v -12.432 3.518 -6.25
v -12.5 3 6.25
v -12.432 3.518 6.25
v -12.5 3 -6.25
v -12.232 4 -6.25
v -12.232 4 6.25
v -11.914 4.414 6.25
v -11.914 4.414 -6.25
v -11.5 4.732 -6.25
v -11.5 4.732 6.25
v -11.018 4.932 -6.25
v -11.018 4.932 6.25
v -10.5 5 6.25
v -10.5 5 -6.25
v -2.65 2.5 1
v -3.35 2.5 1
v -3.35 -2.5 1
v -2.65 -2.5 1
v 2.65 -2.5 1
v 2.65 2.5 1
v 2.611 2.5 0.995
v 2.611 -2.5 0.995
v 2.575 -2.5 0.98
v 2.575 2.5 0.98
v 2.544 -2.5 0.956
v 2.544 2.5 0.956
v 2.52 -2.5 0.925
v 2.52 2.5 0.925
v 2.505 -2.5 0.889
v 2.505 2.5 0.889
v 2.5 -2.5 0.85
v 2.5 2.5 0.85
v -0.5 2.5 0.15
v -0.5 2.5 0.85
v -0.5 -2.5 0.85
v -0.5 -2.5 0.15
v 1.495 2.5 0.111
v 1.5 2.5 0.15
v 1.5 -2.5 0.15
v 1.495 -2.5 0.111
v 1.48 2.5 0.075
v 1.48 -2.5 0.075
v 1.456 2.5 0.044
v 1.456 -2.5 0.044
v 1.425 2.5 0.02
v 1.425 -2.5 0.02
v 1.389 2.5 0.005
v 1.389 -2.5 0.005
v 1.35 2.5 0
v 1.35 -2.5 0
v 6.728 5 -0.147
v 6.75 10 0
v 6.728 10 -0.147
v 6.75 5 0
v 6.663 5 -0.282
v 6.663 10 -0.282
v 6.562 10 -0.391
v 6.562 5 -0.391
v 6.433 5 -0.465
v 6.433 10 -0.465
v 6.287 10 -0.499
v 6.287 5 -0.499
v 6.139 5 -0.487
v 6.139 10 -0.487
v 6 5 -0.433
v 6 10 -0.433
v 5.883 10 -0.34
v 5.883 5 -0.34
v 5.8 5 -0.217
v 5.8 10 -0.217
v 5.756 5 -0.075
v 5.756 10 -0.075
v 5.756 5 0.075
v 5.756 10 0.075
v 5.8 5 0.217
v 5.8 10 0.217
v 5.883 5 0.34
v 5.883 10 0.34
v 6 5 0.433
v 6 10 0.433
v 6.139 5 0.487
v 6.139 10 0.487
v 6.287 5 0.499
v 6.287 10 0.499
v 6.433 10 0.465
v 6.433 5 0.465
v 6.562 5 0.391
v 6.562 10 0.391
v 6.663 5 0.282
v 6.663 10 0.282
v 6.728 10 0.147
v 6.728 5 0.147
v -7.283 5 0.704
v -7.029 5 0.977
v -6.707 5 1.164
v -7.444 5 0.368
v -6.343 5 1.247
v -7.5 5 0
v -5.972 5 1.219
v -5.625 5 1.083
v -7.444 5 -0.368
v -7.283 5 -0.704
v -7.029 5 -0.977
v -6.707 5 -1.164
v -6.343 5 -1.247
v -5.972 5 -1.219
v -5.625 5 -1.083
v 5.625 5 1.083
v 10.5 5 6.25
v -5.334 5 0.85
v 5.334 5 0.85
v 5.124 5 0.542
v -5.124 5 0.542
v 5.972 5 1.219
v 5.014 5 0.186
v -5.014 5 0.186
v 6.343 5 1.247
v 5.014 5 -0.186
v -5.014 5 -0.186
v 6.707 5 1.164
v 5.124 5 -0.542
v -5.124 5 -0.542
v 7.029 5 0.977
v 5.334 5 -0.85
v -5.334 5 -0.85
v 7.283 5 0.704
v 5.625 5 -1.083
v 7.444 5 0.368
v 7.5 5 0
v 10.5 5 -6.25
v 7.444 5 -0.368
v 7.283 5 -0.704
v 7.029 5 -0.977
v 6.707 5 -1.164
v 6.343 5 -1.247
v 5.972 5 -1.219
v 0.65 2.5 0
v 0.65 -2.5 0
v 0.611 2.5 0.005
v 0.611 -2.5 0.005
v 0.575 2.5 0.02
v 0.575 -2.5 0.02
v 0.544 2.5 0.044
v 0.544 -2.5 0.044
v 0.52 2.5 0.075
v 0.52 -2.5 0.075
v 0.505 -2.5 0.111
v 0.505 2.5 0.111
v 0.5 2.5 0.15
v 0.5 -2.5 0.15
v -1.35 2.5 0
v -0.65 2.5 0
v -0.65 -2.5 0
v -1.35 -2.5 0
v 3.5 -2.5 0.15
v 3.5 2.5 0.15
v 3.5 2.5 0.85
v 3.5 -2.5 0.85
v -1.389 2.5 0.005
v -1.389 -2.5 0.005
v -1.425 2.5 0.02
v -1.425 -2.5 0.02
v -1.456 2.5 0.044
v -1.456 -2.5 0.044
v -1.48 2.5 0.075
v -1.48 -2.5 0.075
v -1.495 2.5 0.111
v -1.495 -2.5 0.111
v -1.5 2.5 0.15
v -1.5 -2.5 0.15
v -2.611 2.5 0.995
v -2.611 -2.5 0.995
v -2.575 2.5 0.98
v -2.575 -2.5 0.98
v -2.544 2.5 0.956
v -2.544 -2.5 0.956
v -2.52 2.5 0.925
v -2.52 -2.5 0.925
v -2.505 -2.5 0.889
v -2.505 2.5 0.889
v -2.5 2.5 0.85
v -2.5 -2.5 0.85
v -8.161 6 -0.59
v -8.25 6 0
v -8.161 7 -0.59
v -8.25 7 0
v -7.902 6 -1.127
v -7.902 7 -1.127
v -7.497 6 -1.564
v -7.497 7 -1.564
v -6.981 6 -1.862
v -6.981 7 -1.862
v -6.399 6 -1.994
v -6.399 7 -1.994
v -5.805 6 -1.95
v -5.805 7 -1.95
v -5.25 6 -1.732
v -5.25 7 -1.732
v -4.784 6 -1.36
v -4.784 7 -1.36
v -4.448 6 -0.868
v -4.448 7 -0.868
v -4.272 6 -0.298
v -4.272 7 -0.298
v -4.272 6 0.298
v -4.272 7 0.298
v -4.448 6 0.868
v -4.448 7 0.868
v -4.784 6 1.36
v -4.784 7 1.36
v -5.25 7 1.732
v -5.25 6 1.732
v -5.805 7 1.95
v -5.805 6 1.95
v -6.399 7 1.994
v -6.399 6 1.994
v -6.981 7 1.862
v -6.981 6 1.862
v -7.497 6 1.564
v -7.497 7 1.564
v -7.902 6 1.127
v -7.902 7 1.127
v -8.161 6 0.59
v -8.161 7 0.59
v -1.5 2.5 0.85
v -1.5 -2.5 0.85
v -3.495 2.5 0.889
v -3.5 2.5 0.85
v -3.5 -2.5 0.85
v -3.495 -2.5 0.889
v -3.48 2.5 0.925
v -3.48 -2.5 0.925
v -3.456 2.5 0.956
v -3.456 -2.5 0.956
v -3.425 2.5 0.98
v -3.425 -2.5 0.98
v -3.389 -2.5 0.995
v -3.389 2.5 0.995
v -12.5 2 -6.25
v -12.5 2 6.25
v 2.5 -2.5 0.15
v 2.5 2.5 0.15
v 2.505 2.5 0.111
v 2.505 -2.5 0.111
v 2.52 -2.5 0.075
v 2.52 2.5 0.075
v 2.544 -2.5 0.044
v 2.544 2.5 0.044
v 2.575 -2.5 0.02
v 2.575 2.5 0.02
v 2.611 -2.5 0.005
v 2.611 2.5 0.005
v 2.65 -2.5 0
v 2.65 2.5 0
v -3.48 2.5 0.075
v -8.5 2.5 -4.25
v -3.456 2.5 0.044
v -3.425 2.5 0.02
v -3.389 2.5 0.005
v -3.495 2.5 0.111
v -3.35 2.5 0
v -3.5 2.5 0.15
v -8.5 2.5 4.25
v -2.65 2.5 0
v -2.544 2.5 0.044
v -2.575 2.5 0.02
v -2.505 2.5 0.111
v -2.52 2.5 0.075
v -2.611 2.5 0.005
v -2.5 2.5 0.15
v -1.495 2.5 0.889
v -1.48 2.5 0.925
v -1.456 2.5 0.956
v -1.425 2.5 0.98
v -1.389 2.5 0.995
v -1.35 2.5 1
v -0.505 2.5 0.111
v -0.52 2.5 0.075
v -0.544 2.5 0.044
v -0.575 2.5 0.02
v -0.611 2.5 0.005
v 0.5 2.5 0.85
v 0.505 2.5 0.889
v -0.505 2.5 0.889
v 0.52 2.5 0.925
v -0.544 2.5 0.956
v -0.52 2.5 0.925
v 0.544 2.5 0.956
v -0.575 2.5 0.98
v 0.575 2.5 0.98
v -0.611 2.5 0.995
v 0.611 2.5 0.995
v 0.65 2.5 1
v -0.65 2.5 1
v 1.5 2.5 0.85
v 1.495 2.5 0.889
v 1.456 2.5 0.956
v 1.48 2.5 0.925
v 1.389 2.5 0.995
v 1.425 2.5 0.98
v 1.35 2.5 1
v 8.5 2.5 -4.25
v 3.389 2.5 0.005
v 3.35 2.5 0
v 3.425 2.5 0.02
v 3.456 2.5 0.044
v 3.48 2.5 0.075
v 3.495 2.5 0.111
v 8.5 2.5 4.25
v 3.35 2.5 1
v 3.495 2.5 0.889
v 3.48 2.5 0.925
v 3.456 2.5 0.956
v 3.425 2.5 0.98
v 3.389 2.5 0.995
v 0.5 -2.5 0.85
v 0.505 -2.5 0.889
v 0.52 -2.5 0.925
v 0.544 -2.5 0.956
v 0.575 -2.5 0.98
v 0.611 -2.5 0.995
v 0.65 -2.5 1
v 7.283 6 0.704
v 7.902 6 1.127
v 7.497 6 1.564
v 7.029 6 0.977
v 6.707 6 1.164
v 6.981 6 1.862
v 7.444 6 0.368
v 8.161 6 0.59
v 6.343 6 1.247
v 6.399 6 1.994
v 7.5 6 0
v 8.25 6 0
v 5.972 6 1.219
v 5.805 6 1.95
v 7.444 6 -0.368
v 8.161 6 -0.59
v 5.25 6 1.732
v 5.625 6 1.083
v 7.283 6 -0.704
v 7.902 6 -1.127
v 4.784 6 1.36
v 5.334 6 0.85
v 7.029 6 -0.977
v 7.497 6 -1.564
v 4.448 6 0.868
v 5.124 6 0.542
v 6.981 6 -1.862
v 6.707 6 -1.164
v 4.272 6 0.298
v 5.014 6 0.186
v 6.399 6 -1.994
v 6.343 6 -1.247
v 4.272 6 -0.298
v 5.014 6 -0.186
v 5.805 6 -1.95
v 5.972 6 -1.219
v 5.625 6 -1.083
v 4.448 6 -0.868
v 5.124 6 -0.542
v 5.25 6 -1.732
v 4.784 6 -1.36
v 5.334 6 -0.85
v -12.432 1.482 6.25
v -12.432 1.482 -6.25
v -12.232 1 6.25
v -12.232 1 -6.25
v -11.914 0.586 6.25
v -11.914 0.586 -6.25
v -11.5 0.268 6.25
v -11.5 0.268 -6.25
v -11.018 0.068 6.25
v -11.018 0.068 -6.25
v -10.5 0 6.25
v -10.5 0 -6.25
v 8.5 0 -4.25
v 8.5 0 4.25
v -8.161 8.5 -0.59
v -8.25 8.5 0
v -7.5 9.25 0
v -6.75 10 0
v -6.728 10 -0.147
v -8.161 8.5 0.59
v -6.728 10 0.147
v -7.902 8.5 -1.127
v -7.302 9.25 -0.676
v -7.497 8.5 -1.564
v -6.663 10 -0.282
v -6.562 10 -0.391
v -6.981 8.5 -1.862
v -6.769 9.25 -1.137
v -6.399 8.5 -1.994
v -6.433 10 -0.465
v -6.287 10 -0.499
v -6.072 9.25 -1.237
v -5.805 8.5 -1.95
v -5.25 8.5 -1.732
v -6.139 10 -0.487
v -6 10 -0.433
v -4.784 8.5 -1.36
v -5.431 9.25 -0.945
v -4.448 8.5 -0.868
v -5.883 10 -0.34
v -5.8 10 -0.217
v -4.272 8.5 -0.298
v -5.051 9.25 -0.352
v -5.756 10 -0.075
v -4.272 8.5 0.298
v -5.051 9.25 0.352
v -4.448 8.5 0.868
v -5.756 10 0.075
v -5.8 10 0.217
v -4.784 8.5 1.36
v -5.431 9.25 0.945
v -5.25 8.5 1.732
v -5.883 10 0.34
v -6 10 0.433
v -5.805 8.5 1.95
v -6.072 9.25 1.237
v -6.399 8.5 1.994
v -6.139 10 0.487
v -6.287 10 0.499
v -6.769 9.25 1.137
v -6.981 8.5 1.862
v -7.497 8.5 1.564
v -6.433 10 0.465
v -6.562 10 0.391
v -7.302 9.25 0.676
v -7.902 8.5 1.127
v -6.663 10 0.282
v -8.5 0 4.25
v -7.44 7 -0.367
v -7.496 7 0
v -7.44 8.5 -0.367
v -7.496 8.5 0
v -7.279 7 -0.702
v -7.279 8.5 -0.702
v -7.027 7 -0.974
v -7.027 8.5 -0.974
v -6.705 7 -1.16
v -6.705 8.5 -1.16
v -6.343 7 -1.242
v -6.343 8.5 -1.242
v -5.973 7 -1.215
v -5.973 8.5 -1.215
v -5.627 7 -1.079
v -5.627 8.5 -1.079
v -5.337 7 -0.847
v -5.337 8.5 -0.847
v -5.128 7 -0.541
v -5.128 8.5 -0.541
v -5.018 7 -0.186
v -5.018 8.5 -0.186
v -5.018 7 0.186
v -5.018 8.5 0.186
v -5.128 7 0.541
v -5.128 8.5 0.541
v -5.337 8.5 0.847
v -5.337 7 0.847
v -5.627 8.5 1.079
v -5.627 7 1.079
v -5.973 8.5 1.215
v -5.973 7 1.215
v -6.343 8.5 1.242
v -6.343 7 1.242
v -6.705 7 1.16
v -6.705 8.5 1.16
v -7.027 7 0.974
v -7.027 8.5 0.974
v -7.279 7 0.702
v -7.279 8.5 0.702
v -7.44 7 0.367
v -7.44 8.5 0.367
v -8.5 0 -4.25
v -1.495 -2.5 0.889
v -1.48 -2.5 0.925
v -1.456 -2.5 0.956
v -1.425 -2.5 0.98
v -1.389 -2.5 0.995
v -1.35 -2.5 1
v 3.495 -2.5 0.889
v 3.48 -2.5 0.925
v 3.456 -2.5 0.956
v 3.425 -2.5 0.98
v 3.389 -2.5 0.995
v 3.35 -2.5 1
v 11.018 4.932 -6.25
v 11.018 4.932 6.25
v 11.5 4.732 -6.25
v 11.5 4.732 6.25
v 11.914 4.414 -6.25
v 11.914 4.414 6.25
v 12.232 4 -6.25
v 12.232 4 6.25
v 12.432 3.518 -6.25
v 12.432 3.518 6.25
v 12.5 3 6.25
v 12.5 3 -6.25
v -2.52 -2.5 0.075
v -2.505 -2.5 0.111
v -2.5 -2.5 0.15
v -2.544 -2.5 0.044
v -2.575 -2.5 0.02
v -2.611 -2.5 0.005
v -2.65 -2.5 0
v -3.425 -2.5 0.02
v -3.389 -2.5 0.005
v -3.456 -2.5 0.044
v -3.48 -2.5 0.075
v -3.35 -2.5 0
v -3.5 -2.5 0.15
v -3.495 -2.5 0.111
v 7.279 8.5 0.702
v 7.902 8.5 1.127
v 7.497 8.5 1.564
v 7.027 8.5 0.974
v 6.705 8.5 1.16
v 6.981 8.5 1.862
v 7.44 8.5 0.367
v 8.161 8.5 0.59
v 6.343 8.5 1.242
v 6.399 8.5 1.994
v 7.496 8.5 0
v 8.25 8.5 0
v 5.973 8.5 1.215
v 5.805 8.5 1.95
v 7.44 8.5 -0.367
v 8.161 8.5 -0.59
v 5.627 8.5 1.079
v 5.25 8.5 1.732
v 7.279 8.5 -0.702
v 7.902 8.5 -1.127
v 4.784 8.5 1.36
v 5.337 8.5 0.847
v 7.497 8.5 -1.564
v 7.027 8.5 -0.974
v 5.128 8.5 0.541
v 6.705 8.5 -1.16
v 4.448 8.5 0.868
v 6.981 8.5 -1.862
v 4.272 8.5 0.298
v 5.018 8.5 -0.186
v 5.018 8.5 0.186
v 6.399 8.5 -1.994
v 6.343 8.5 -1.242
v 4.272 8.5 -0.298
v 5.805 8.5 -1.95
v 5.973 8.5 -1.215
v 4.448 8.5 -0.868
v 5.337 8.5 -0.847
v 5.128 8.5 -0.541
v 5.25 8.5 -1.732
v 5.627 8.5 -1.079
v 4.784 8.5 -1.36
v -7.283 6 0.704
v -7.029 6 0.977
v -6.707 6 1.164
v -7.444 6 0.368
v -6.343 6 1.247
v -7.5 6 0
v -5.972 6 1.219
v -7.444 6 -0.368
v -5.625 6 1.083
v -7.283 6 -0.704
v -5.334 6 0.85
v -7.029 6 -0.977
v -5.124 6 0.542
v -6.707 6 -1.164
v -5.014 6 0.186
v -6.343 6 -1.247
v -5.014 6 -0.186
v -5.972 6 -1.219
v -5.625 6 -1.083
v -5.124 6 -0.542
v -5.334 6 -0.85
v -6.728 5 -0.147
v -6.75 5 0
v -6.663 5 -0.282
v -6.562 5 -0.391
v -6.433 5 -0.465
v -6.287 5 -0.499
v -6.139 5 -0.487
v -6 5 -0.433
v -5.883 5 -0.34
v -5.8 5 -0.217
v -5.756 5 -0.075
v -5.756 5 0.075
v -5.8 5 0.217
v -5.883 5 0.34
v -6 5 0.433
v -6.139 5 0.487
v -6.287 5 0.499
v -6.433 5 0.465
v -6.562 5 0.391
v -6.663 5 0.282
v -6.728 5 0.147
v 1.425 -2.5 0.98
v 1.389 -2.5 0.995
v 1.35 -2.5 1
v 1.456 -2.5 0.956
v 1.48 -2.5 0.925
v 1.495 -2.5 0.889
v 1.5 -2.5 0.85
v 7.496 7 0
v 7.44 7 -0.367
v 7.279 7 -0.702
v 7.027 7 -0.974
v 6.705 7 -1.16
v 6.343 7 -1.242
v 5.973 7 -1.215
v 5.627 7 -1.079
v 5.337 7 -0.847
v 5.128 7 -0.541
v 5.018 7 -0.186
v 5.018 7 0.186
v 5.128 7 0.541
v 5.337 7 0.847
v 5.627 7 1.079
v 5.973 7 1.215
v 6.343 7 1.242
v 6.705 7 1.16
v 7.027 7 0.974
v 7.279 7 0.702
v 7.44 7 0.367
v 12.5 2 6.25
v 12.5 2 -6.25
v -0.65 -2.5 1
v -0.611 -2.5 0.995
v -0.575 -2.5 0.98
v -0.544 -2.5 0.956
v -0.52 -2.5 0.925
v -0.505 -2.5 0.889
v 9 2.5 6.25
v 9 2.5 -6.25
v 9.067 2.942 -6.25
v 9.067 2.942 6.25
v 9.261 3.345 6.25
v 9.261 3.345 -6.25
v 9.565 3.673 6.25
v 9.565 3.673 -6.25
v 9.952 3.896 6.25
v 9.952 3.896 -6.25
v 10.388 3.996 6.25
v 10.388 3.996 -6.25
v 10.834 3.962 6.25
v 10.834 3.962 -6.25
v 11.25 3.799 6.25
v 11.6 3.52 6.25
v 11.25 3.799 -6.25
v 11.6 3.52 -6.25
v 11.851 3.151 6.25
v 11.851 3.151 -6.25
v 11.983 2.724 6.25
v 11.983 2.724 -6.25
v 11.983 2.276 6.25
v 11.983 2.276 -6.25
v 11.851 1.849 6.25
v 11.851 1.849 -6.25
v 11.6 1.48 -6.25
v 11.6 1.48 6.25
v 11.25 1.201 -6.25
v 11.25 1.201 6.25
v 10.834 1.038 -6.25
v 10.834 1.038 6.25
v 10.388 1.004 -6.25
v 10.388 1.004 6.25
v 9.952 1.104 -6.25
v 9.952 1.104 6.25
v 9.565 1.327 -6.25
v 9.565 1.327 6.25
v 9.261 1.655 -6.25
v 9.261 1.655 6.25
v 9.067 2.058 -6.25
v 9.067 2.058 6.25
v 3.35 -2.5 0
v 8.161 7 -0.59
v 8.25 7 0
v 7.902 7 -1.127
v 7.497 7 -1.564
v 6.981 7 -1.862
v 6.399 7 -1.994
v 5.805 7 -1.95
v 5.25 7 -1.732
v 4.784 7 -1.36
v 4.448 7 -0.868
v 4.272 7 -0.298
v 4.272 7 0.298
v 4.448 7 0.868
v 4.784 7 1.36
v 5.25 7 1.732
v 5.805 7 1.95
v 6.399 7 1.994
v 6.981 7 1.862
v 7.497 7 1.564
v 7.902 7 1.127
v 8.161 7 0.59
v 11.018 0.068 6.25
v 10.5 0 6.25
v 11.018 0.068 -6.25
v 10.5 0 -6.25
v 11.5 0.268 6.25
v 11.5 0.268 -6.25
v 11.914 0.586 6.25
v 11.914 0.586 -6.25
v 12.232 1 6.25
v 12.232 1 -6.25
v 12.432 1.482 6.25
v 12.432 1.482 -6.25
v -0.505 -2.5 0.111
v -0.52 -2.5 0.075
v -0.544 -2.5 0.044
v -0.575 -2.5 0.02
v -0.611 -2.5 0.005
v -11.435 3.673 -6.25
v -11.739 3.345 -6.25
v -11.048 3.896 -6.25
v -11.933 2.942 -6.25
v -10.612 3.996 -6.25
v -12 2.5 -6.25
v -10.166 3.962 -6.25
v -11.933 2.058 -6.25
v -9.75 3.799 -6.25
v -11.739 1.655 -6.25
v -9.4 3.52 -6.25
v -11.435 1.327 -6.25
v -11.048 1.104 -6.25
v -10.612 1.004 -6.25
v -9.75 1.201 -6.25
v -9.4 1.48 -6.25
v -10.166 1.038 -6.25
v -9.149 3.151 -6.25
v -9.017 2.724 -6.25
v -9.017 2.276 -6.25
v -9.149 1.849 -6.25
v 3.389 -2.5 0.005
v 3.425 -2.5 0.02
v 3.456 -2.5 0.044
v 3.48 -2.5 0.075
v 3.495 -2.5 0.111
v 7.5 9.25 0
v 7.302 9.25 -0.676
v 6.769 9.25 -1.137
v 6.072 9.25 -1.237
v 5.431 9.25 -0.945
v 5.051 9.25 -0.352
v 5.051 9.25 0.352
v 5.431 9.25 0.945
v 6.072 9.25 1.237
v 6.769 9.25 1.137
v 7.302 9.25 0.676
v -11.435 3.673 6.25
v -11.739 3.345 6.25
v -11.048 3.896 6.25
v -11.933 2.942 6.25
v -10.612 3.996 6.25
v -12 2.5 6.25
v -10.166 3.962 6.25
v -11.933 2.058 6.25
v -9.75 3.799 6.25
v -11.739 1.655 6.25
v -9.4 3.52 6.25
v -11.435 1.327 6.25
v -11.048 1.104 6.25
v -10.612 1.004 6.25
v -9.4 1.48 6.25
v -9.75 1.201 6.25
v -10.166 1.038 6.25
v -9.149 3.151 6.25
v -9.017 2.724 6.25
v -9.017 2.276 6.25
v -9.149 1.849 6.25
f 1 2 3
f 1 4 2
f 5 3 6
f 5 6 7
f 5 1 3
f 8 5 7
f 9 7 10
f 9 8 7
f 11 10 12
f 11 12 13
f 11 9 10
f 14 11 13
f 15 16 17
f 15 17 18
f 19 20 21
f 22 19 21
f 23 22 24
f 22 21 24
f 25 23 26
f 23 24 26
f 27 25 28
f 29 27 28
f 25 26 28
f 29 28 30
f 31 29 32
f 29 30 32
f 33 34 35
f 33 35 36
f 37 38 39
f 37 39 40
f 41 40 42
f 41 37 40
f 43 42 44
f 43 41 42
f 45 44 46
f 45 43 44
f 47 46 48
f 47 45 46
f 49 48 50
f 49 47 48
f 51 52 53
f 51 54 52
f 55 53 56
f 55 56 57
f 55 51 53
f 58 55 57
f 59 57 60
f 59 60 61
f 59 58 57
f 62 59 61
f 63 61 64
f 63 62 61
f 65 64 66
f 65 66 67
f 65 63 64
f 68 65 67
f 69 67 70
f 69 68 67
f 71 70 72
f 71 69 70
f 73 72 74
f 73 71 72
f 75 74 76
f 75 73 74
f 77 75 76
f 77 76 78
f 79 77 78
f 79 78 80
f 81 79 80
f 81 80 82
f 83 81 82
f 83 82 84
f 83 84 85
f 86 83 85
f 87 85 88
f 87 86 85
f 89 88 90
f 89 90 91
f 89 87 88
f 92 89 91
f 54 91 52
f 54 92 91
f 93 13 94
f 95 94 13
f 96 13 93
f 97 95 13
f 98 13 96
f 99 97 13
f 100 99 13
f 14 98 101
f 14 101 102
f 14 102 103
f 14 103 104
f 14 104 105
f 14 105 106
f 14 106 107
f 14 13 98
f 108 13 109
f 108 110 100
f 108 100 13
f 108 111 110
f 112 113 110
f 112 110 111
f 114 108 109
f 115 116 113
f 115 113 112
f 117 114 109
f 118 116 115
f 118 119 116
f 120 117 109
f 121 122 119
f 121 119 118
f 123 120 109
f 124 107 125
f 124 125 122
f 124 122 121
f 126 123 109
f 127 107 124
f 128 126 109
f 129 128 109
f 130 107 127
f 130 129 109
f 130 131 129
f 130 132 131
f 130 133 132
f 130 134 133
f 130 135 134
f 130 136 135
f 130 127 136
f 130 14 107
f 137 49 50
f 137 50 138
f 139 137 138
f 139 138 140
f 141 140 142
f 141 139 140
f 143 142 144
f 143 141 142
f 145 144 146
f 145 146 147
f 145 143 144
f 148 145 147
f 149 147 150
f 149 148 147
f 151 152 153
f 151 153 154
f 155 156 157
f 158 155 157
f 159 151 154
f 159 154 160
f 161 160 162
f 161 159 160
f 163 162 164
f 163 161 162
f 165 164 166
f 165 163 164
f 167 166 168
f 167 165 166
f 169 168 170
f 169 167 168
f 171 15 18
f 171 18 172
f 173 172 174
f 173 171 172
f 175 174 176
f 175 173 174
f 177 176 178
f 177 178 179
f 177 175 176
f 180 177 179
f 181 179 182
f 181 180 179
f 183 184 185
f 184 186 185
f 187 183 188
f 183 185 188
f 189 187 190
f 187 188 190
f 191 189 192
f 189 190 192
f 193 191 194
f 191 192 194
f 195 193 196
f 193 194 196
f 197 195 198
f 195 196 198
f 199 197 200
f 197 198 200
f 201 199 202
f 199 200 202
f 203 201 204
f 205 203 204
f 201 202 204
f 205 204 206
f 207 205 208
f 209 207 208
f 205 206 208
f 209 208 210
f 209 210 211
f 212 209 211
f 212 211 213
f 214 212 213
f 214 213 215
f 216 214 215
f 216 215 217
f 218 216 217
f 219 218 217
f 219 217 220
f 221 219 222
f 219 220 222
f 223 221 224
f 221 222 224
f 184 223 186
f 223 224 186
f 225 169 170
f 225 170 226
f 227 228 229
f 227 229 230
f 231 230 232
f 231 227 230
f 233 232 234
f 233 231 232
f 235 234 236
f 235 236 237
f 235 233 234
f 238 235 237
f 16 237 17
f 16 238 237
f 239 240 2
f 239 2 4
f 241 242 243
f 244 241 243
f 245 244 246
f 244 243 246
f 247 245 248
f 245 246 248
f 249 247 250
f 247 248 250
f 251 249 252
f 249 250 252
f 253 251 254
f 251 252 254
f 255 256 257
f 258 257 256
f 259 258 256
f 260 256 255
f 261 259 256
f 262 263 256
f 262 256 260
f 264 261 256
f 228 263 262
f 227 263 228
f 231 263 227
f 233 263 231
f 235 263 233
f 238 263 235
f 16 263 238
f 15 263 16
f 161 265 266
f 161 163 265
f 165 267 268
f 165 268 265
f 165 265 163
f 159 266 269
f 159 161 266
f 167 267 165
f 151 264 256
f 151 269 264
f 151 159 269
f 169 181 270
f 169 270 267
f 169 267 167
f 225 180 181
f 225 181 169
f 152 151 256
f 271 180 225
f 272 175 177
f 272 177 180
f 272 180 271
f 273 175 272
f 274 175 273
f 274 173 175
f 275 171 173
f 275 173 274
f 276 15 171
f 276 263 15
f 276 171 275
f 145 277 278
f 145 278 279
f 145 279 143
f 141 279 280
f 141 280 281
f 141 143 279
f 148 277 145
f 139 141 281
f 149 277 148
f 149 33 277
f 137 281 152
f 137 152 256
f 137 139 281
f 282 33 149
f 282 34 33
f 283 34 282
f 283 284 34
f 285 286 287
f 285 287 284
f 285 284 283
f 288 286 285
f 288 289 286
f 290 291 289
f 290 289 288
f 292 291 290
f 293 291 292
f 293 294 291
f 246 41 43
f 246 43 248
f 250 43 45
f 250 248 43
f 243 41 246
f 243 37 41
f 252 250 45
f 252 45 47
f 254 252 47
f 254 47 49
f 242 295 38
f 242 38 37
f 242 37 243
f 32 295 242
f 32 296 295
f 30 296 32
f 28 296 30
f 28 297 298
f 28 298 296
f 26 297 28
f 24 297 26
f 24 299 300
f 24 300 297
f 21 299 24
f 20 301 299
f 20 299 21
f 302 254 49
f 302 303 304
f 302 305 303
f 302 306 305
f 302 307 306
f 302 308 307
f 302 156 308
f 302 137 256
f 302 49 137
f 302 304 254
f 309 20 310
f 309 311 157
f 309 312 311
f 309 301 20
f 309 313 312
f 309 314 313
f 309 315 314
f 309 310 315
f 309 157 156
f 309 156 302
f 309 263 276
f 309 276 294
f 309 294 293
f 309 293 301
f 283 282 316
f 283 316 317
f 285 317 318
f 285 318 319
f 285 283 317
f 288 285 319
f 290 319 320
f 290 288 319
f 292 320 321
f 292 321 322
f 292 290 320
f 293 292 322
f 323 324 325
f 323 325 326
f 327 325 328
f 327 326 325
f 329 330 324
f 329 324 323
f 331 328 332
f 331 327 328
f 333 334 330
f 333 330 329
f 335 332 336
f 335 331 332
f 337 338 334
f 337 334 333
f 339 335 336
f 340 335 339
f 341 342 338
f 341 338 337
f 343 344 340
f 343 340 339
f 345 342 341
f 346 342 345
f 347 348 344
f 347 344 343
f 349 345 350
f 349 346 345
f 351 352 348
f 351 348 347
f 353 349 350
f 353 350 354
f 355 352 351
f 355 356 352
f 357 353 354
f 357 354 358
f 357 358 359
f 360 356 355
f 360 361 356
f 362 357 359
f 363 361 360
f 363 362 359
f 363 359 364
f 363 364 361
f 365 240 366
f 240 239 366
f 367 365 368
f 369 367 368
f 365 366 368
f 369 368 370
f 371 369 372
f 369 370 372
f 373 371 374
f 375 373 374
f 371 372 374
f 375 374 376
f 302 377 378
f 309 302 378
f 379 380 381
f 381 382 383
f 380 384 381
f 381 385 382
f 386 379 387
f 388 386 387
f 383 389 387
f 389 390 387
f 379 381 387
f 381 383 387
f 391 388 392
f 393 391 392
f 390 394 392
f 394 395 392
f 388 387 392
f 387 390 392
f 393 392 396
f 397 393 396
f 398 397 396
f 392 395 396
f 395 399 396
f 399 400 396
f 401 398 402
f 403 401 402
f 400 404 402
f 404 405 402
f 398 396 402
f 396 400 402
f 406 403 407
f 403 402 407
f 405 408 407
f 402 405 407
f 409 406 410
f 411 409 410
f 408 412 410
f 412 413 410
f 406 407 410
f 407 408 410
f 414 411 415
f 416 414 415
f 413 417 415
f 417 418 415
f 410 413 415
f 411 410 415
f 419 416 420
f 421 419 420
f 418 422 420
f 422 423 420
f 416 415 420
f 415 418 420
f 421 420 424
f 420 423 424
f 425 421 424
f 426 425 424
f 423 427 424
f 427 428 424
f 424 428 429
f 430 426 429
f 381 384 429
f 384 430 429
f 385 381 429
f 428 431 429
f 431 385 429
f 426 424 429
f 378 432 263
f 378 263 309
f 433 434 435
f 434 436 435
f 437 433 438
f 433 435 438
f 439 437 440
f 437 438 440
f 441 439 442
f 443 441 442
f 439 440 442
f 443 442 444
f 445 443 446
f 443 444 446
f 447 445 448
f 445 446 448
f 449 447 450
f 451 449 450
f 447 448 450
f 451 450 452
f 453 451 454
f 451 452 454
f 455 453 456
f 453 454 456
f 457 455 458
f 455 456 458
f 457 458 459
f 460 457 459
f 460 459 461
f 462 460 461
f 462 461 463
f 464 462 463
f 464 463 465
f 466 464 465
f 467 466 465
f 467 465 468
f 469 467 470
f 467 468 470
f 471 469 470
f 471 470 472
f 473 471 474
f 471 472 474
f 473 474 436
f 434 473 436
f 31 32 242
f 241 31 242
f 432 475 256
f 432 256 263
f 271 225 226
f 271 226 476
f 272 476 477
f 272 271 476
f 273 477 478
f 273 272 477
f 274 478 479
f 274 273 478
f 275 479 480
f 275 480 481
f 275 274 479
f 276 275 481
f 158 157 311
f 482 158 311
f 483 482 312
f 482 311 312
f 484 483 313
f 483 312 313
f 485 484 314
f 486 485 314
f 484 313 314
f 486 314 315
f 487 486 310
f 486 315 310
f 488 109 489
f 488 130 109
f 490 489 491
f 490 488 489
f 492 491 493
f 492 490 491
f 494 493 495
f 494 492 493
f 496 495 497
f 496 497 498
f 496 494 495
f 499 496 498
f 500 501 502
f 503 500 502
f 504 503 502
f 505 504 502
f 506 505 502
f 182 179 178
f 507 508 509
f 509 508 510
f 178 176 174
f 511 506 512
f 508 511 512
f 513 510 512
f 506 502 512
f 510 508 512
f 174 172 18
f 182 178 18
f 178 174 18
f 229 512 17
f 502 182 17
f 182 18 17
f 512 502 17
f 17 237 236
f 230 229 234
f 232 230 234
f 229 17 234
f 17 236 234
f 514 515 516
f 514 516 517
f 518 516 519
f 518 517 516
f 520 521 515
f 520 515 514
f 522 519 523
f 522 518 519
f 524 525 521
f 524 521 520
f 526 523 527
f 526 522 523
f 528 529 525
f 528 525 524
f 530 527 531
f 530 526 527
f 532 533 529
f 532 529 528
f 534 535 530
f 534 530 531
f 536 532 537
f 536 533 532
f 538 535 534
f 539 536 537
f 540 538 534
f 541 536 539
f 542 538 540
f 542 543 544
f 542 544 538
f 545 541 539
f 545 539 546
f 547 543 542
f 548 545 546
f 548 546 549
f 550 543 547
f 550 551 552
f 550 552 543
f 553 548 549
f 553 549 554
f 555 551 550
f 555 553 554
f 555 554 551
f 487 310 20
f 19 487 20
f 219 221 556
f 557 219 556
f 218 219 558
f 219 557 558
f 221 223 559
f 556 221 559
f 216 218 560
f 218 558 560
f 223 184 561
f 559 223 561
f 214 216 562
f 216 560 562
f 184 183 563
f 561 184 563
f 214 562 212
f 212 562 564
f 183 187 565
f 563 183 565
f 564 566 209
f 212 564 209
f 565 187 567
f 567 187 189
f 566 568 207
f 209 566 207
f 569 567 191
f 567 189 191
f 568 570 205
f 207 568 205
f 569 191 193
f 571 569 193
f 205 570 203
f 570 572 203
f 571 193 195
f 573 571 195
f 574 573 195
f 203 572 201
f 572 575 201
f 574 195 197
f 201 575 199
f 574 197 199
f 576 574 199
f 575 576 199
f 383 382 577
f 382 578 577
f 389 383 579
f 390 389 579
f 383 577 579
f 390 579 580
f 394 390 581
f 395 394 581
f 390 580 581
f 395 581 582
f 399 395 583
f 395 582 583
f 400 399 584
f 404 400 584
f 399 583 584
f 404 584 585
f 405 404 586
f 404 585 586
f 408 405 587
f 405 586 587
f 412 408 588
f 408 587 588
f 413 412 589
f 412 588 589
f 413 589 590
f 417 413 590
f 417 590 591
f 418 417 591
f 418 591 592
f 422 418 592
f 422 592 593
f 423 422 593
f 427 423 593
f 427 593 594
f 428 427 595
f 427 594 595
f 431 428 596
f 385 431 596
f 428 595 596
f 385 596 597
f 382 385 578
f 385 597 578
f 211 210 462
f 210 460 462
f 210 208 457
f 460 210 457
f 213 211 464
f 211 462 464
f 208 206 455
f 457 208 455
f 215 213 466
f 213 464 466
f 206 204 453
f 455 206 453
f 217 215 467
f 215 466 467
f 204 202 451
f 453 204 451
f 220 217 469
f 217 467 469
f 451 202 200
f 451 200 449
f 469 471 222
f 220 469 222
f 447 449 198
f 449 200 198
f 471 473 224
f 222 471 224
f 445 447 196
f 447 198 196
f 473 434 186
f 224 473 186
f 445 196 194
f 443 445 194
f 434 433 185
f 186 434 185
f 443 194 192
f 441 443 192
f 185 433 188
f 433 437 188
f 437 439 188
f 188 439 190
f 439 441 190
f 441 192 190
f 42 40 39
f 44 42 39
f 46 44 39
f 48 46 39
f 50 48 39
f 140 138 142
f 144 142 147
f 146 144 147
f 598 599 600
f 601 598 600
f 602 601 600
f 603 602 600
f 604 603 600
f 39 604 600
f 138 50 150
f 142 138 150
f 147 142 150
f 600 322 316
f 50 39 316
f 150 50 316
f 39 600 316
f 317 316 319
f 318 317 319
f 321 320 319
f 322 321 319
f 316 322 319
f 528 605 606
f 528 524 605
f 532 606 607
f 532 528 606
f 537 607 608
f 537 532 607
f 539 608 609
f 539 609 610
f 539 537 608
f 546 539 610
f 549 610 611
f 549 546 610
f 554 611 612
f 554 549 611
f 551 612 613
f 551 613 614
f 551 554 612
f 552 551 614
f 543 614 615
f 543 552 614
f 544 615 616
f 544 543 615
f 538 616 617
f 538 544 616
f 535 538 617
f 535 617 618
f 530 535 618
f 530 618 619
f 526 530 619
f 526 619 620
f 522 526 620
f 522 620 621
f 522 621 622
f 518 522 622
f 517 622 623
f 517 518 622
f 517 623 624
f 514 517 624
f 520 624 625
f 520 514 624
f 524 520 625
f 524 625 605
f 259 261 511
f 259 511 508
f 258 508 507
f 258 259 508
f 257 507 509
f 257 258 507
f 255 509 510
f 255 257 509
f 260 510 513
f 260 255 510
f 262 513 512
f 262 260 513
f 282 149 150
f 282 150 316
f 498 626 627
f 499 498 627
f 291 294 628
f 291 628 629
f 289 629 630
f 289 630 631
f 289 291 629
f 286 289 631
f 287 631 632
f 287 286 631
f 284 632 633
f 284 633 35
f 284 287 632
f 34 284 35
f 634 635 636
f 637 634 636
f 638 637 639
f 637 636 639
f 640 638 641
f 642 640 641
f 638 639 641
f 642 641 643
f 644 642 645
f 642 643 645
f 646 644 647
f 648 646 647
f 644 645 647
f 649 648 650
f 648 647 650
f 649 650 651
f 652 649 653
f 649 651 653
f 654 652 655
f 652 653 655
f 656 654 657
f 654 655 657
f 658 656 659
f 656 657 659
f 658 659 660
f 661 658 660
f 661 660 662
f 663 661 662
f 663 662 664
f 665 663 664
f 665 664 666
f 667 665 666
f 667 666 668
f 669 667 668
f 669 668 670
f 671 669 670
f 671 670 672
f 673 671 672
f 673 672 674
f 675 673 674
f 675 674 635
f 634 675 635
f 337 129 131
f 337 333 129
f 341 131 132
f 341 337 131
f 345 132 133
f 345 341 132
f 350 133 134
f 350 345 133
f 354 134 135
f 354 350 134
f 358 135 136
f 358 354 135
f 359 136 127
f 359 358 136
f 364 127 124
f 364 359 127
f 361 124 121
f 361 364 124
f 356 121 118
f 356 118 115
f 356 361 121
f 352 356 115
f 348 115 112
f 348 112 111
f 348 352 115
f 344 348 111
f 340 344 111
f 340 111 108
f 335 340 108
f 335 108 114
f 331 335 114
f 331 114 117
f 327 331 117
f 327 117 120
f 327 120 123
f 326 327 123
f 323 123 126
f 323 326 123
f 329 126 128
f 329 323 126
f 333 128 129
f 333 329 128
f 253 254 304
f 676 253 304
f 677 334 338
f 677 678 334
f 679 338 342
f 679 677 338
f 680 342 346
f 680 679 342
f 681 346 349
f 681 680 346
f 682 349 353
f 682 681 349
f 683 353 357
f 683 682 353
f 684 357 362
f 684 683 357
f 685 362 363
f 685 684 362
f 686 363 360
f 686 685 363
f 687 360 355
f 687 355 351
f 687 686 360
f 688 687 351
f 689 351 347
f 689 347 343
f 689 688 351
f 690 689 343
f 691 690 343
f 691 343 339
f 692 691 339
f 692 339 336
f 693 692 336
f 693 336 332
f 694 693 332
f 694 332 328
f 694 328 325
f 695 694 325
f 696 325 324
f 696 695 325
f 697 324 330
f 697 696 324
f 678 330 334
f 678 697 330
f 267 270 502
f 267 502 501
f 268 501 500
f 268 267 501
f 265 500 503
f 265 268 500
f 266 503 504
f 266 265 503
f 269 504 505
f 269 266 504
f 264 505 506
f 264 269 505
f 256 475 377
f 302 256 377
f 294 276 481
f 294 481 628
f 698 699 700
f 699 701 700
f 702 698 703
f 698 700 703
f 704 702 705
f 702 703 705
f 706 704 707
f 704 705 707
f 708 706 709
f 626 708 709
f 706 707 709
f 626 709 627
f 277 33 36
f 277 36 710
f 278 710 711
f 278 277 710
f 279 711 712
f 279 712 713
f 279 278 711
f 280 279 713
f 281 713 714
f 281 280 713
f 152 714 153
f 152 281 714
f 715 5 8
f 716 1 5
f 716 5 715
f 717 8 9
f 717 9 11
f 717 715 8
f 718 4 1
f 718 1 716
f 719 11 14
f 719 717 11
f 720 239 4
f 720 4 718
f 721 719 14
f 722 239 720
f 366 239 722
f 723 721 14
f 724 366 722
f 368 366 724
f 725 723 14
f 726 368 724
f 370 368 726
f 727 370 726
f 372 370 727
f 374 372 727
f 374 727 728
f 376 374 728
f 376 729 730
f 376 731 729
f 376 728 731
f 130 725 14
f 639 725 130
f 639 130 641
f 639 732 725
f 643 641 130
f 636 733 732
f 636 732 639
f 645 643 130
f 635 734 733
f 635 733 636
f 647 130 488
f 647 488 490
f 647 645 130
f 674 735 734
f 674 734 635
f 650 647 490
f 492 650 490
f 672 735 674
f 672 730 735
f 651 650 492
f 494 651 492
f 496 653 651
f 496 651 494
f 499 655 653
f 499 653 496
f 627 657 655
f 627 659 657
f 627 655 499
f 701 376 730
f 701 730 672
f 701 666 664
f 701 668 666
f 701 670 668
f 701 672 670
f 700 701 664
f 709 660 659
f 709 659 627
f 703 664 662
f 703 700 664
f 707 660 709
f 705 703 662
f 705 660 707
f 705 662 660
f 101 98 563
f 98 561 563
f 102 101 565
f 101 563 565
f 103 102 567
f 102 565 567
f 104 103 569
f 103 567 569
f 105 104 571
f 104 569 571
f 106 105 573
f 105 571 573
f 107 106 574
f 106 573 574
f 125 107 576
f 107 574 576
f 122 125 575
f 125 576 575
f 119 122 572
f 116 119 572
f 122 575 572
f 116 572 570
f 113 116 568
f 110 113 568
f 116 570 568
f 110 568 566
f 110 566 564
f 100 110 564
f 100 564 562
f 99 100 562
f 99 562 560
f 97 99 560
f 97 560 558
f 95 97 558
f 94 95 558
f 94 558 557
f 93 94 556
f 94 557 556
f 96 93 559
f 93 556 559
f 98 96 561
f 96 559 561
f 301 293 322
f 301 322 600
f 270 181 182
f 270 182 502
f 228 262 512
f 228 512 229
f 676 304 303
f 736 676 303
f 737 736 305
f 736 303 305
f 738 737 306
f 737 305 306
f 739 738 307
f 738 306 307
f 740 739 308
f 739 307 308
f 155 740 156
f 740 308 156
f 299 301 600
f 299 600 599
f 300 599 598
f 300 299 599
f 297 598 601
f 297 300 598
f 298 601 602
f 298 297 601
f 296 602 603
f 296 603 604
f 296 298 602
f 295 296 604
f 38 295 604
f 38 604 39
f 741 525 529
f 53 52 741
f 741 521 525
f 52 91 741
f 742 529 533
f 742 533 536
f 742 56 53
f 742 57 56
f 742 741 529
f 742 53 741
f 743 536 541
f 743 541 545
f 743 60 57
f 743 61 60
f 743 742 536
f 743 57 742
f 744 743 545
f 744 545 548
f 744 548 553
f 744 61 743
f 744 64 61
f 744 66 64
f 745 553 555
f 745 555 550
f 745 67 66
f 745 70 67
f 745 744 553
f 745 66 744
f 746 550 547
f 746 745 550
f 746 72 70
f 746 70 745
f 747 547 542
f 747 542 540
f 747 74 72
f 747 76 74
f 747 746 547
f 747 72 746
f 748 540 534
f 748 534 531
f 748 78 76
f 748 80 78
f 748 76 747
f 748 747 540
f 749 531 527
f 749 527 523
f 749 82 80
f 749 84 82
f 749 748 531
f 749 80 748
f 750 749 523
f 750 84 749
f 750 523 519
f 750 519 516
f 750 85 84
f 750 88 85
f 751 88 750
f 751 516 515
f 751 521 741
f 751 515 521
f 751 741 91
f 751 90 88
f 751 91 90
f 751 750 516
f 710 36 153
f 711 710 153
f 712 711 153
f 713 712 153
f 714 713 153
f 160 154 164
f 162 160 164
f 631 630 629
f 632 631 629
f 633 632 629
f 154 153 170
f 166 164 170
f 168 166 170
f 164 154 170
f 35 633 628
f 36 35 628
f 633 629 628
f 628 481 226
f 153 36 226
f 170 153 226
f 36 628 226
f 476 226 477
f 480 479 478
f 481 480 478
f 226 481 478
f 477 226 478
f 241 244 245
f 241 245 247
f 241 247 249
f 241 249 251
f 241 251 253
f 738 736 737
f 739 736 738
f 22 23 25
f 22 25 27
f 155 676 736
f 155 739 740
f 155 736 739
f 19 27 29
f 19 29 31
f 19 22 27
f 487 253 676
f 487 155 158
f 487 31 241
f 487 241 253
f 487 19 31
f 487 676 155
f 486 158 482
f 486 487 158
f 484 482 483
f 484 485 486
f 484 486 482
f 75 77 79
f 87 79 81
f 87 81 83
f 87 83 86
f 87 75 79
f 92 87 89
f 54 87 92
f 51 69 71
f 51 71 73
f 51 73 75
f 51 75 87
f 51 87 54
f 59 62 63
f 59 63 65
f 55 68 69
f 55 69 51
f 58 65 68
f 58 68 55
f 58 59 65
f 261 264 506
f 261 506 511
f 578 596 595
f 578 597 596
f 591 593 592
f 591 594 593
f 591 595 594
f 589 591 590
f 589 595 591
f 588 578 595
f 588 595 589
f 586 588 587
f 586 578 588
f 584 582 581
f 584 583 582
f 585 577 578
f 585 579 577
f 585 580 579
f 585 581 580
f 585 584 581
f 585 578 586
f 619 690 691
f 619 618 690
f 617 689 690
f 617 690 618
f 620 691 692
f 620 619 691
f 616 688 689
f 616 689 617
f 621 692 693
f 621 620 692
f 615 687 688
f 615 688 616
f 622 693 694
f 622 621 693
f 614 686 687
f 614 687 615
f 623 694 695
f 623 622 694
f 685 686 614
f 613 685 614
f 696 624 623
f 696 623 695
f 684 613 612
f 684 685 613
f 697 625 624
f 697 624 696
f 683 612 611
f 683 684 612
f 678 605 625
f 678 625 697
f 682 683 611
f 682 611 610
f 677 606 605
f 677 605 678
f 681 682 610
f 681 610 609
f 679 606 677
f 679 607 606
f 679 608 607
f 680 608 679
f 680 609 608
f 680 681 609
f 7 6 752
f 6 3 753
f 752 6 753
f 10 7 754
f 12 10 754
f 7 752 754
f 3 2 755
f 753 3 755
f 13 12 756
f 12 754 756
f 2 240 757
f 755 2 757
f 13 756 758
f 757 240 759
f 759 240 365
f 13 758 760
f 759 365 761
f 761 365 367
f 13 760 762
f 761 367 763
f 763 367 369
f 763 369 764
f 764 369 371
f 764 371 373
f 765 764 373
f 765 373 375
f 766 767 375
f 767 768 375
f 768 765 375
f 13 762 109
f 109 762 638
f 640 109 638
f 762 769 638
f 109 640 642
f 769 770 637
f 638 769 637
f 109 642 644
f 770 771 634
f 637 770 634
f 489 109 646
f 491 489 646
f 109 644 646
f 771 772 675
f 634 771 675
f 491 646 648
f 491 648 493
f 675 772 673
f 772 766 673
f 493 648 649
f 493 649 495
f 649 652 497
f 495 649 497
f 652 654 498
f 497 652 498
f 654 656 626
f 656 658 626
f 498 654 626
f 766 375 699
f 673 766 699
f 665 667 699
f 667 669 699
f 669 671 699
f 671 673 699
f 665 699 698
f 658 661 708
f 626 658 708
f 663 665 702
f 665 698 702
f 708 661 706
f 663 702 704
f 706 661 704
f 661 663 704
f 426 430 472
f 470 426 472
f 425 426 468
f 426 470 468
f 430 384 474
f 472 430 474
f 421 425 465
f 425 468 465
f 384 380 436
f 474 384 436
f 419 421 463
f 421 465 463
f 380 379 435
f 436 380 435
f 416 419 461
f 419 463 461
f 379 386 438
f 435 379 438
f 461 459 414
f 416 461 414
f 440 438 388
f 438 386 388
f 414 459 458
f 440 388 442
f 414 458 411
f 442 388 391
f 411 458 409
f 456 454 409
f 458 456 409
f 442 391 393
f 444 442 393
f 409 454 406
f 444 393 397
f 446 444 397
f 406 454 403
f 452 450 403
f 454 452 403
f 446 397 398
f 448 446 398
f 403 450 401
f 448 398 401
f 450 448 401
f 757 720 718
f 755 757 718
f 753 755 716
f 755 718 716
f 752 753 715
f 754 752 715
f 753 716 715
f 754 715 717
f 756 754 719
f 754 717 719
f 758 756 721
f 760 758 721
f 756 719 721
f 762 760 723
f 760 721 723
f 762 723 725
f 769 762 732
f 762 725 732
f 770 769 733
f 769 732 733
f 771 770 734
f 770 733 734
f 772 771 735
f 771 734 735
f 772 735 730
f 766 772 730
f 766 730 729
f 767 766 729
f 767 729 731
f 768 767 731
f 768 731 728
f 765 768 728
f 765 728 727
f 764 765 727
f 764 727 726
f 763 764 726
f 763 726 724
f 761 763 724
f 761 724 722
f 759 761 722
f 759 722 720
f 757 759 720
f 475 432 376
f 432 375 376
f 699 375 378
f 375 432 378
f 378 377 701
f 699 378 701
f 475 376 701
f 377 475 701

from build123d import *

# Parameters (mm, degrees)
SKETCH1_W           = 25
SKETCH1_H           = 12.5
BOSS_EXTRUDE1_DEPTH = 5
FILLET1_R           = 2
SKETCH4_R           = 1.5
CUT_EXTRUDE1_DEPTH  = 21.310096012
SKETCH5_W           = 17
SKETCH5_H           = 8.5
CUT_EXTRUDE2_DEPTH  = 2.5
BOSS_EXTRUDE2_DEPTH = 5


with BuildPart() as part:
    # Sketch1 → Boss-Extrude1 (new body)
    with BuildSketch(Plane(origin=(0, 0, 0), x_dir=(1, 0, 0), z_dir=(0, 1, 0))):
        Rectangle(SKETCH1_W, SKETCH1_H)
    extrude(amount=BOSS_EXTRUDE1_DEPTH)

    # Sketch3 → Revolve1 (revolve)
    with BuildSketch(Plane.XY):
        Polygon((-6.75, 5), (-7.5, 5), (-7.5, 6), (-8.25, 6), (-8.25, 7), (-7.495786155, 7), (-7.495786155, 8.5), (-8.25, 8.5), (-6.75, 10), align=None)
    revolve1 = revolve(axis=Axis((-6.25, 11.553372133, 0), (0, -1, 0)))

    # Fillet1
    fillet1_edges = [part.edges().sort_by_distance(p)[0] for p in [
        (12.5, 5, 0),
        (-12.5, 5, 0),
        (12.5, 0, 0),
        (-12.5, 0, 0),
    ]]
    fillet(fillet1_edges, radius=FILLET1_R)

    # Sketch4 → Cut-Extrude1 (cut, through all)
    with BuildSketch(Plane(origin=(0, 0, -6.25), x_dir=(-1, 0, 0), z_dir=(0, 0, -1))):
        with Locations((10.5, 2.5)):
            Circle(SKETCH4_R)
        with Locations((-10.5, 2.5)):
            Circle(SKETCH4_R)
    extrude(amount=-CUT_EXTRUDE1_DEPTH, mode=Mode.SUBTRACT)

    # Mirror1: Revolve1 across plane
    add(revolve1.mirror(Plane(origin=(0, 0, 0), x_dir=(0, 0, 1), z_dir=(1, 0, 0))))

    # Sketch5 → Cut-Extrude2 (cut)
    with BuildSketch(Plane.XZ):
        Rectangle(SKETCH5_W, SKETCH5_H)
    extrude(amount=-CUT_EXTRUDE2_DEPTH, mode=Mode.SUBTRACT)

    # Sketch6 → Boss-Extrude2 (add)
    with BuildSketch(Plane.XZ.offset(-2.5)):
        with BuildLine():
            Line((0.5, 0.15), (0.5, 0.85))
            ThreePointArc((0.5, 0.85), (0.543933983, 0.956066017), (0.65, 1))
            Line((0.65, 1), (1.35, 1))
            ThreePointArc((1.35, 1), (1.456066017, 0.956066017), (1.5, 0.85))
            Line((1.5, 0.85), (1.5, 0.15))
            ThreePointArc((1.5, 0.15), (1.456066017, 0.043933983), (1.35, 0))
            Line((1.35, 0), (0.65, 0))
            ThreePointArc((0.65, 0), (0.543933983, 0.043933983), (0.5, 0.15))
        make_face()
        with BuildLine():
            Line((2.65, 0), (3.35, 0))
            ThreePointArc((3.35, 0), (3.456066017, 0.043933983), (3.5, 0.15))
            Line((3.5, 0.15), (3.5, 0.85))
            ThreePointArc((3.5, 0.85), (3.456066017, 0.956066017), (3.35, 1))
            Line((3.35, 1), (2.65, 1))
            ThreePointArc((2.65, 1), (2.543933983, 0.956066017), (2.5, 0.85))
            Line((2.5, 0.85), (2.5, 0.15))
            ThreePointArc((2.5, 0.15), (2.543933983, 0.043933983), (2.65, 0))
        make_face()
        with BuildLine():
            Line((-1.5, 0.15), (-1.5, 0.85))
            ThreePointArc((-1.5, 0.85), (-1.456066017, 0.956066017), (-1.35, 1))
            Line((-1.35, 1), (-0.65, 1))
            ThreePointArc((-0.65, 1), (-0.543933983, 0.956066017), (-0.5, 0.85))
            Line((-0.5, 0.85), (-0.5, 0.15))
            ThreePointArc((-0.5, 0.15), (-0.543933983, 0.043933983), (-0.65, 0))
            Line((-0.65, 0), (-1.35, 0))
            ThreePointArc((-1.35, 0), (-1.456066017, 0.043933983), (-1.5, 0.15))
        make_face()
        with BuildLine():
            Line((-3.5, 0.15), (-3.5, 0.85))
            ThreePointArc((-3.5, 0.85), (-3.456066017, 0.956066017), (-3.35, 1))
            Line((-3.35, 1), (-2.65, 1))
            ThreePointArc((-2.65, 1), (-2.543933983, 0.956066017), (-2.5, 0.85))
            Line((-2.5, 0.85), (-2.5, 0.15))
            ThreePointArc((-2.5, 0.15), (-2.543933983, 0.043933983), (-2.65, 0))
            Line((-2.65, 0), (-3.35, 0))
            ThreePointArc((-3.35, 0), (-3.456066017, 0.043933983), (-3.5, 0.15))
        make_face()
    extrude(amount=BOSS_EXTRUDE2_DEPTH)


solid = part.part
